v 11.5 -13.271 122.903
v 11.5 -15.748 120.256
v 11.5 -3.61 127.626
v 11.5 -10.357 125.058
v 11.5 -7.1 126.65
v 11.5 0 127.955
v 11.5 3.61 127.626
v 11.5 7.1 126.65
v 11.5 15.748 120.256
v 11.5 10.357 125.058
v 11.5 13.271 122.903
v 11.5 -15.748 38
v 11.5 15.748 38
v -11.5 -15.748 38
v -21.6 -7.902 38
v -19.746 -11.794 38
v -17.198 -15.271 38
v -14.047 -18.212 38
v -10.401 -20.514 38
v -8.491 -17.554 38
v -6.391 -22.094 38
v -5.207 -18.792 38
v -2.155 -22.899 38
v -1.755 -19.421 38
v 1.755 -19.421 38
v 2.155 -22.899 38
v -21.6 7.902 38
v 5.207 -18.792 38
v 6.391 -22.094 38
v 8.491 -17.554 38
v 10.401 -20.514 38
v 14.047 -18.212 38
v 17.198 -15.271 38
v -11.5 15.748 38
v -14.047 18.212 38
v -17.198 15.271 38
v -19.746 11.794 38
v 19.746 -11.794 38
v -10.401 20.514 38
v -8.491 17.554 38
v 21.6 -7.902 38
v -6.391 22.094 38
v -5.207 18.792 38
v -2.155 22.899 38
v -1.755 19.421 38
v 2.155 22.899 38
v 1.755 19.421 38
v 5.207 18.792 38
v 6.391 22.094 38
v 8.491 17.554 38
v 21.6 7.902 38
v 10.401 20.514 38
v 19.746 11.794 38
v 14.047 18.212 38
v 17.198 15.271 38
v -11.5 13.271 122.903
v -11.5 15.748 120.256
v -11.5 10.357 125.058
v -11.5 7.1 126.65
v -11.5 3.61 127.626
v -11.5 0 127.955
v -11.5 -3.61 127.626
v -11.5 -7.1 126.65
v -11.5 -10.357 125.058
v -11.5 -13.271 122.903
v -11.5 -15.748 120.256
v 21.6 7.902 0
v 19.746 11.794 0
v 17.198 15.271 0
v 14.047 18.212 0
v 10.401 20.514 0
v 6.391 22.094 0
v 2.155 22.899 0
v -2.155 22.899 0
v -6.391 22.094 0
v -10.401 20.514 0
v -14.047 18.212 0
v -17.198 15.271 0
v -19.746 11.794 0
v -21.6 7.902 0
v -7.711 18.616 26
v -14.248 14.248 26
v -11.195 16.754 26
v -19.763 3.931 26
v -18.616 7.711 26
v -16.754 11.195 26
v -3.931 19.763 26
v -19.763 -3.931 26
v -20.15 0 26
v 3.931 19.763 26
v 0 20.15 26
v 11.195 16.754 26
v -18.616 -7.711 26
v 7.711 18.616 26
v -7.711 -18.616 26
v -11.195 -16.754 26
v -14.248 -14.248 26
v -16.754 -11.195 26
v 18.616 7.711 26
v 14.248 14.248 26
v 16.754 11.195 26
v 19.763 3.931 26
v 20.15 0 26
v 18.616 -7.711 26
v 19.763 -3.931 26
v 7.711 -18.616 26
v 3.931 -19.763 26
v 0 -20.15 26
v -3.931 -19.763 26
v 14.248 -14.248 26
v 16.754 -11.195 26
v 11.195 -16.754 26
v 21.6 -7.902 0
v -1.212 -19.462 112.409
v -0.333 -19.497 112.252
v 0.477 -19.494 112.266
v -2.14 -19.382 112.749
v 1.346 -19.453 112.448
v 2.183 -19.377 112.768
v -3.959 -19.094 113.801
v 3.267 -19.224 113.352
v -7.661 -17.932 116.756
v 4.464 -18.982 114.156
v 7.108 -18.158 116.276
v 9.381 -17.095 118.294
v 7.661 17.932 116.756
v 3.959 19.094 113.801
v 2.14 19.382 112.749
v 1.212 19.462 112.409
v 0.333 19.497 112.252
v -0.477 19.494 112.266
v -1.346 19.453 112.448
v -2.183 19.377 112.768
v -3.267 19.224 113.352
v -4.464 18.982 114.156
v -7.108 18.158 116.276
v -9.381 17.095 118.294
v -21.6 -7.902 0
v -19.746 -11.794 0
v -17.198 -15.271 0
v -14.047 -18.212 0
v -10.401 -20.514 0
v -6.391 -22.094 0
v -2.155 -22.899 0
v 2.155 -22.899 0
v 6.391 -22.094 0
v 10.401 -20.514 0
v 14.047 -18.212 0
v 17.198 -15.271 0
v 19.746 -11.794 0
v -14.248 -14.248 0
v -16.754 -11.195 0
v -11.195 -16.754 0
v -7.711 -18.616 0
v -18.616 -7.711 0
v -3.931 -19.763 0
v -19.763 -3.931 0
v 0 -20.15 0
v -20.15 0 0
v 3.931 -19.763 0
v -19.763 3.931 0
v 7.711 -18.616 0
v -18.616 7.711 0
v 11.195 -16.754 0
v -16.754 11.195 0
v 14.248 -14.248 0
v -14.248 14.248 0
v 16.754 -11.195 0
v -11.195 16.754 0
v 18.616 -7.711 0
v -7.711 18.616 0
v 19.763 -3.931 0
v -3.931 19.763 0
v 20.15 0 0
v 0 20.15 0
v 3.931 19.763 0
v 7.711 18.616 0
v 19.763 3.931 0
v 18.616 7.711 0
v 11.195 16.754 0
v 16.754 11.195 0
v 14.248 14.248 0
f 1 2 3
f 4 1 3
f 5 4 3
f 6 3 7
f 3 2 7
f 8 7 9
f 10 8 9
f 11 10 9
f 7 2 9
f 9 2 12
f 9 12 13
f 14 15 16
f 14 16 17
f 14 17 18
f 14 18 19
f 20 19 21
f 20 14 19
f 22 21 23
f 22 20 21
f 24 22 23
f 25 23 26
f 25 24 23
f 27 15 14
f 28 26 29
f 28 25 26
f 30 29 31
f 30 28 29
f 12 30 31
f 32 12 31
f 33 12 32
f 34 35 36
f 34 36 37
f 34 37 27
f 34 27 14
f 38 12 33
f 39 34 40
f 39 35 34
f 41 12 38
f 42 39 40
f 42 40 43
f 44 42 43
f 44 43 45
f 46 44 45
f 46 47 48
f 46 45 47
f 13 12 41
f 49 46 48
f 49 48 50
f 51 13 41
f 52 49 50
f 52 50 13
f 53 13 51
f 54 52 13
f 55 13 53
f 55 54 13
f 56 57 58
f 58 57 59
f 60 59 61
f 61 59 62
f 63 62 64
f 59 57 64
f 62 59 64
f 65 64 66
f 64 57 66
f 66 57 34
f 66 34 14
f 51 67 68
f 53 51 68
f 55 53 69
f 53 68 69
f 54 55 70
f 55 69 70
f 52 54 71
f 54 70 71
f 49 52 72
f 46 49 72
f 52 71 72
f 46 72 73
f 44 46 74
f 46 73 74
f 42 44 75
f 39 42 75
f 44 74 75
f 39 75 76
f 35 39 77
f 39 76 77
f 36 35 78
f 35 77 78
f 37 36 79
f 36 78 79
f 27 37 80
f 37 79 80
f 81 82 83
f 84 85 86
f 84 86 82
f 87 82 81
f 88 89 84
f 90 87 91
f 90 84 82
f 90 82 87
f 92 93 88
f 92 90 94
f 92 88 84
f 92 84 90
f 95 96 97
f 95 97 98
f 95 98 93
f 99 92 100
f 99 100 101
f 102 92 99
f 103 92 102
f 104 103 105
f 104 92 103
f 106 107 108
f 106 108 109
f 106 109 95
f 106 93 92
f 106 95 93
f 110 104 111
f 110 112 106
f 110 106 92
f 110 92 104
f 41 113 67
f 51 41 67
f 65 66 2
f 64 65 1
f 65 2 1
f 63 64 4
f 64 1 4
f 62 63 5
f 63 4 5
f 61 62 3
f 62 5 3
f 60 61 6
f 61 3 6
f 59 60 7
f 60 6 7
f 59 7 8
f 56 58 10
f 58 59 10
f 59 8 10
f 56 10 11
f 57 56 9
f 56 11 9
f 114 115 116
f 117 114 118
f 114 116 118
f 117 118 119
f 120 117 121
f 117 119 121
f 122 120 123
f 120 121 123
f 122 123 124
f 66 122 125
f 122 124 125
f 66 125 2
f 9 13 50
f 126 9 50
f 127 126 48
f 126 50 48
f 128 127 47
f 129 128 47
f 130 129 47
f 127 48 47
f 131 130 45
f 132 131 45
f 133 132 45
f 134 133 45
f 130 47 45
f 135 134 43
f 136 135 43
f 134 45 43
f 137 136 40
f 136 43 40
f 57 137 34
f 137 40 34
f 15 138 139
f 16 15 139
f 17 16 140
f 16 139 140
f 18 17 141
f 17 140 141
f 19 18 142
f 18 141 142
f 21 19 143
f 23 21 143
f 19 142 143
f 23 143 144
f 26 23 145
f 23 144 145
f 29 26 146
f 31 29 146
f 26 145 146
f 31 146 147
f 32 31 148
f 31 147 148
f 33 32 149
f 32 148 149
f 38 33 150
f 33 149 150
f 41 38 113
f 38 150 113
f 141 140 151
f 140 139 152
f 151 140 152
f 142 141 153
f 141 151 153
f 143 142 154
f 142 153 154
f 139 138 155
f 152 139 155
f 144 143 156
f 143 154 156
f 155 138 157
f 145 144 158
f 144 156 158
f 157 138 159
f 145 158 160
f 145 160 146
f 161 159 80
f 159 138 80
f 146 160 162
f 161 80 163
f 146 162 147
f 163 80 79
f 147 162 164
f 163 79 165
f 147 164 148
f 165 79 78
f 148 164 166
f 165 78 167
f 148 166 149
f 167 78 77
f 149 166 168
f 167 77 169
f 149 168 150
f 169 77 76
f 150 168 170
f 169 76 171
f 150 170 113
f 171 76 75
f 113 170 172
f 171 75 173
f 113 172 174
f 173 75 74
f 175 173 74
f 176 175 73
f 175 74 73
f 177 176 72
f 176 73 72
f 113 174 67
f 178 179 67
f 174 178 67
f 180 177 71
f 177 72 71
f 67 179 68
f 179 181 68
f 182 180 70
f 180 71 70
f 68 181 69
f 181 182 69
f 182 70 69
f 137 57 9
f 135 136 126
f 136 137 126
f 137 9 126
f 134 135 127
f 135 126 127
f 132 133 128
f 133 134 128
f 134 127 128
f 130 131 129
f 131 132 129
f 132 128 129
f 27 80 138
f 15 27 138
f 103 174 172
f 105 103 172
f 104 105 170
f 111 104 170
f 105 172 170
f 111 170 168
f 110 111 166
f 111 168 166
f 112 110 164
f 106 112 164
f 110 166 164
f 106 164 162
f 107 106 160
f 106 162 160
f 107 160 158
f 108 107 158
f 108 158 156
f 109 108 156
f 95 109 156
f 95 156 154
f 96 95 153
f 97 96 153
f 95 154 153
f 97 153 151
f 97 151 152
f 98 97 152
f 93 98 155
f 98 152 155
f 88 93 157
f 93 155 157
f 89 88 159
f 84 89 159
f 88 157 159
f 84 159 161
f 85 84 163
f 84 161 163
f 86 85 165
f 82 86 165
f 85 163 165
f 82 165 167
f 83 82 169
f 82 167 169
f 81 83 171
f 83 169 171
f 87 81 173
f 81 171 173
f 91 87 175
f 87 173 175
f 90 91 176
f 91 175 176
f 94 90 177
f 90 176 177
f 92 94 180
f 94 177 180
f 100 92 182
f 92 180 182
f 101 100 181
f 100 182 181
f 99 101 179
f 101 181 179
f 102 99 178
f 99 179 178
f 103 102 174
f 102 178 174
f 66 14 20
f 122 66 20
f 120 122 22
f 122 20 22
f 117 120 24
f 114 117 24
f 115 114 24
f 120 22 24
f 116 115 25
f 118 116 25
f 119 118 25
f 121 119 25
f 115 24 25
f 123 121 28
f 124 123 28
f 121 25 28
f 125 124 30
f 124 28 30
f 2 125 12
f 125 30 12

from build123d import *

# Parameters (mm, degrees)
F1_DEPTH = 38
F3_DEPTH = 93
F5_DEPTH = 35
F6_R     = 20.15
F7_DEPTH = 26


with BuildPart() as f1:
    # F0 (on Top) → F1 (new body)
    with BuildSketch(Plane.XY):
        with BuildLine():
            Line((21.6, -7.9018985061), (21.6, 7.9018985061))
            ThreePointArc((21.6, 7.9018985061), (0, 23), (-21.6, 7.9018985061))
            Line((-21.6, 7.9018985061), (-21.6, -7.9018985061))
            ThreePointArc((-21.6, -7.9018985061), (0, -23), (21.6, -7.9018985061))
        make_face()
    extrude(amount=F1_DEPTH)

    # F2 (on face) → F3 (join)
    with BuildSketch(Plane.XY.offset(38)):
        with BuildLine():
            Line((11.5, 0), (11.5, 15.748015748))
            ThreePointArc((11.5, 15.748015748), (0, 19.5), (-11.5, 15.748015748))
            Line((-11.5, 15.748015748), (-11.5, -15.748015748))
            ThreePointArc((-11.5, -15.748015748), (0, -19.5), (11.5, -15.748015748))
            Line((11.5, -15.748015748), (11.5, 0))
        make_face()
    extrude(amount=F3_DEPTH)

    # F4 (on face) → F5 (cut)
    with BuildSketch(Plane.YZ.offset(11.5)):
        with BuildLine():
            ThreePointArc((15.748015748, 120.2564661625), (18.8743223664, 114.4792683229), (19.9554745068, 108))
            Line((19.9554745068, 108), (37.2544378042, 135.0286304951))
            Line((37.2544378042, 135.0286304951), (-38.2512100041, 135.0286304951))
            Line((-38.2512100041, 135.0286304951), (-19.9554745068, 108))
            ThreePointArc((-19.9554745068, 108), (-18.8743223664, 114.4792683229), (-15.748015748, 120.2564661625))
            Line((-15.748015748, 120.2564661625), (-15.748015748, 131))
            Line((-15.748015748, 131), (15.748015748, 131))
            Line((15.748015748, 131), (15.748015748, 120.2564661625))
        make_face()
        with BuildLine():
            ThreePointArc((-15.748015748, 120.2564661625), (0, 127.9554745068), (15.748015748, 120.2564661625))
            Line((15.748015748, 120.2564661625), (15.748015748, 131))
            Line((15.748015748, 131), (-15.748015748, 131))
            Line((-15.748015748, 131), (-15.748015748, 120.2564661625))
        make_face()
    extrude(amount=-F5_DEPTH, mode=Mode.SUBTRACT)

    # F6 (on face) → F7 (cut)
    with BuildSketch(Plane(origin=(0, 0, 0), x_dir=(1, 0, 0), z_dir=(0, 0, -1))):
        Circle(F6_R)
    extrude(amount=-F7_DEPTH, mode=Mode.SUBTRACT)


solid = f1.part
